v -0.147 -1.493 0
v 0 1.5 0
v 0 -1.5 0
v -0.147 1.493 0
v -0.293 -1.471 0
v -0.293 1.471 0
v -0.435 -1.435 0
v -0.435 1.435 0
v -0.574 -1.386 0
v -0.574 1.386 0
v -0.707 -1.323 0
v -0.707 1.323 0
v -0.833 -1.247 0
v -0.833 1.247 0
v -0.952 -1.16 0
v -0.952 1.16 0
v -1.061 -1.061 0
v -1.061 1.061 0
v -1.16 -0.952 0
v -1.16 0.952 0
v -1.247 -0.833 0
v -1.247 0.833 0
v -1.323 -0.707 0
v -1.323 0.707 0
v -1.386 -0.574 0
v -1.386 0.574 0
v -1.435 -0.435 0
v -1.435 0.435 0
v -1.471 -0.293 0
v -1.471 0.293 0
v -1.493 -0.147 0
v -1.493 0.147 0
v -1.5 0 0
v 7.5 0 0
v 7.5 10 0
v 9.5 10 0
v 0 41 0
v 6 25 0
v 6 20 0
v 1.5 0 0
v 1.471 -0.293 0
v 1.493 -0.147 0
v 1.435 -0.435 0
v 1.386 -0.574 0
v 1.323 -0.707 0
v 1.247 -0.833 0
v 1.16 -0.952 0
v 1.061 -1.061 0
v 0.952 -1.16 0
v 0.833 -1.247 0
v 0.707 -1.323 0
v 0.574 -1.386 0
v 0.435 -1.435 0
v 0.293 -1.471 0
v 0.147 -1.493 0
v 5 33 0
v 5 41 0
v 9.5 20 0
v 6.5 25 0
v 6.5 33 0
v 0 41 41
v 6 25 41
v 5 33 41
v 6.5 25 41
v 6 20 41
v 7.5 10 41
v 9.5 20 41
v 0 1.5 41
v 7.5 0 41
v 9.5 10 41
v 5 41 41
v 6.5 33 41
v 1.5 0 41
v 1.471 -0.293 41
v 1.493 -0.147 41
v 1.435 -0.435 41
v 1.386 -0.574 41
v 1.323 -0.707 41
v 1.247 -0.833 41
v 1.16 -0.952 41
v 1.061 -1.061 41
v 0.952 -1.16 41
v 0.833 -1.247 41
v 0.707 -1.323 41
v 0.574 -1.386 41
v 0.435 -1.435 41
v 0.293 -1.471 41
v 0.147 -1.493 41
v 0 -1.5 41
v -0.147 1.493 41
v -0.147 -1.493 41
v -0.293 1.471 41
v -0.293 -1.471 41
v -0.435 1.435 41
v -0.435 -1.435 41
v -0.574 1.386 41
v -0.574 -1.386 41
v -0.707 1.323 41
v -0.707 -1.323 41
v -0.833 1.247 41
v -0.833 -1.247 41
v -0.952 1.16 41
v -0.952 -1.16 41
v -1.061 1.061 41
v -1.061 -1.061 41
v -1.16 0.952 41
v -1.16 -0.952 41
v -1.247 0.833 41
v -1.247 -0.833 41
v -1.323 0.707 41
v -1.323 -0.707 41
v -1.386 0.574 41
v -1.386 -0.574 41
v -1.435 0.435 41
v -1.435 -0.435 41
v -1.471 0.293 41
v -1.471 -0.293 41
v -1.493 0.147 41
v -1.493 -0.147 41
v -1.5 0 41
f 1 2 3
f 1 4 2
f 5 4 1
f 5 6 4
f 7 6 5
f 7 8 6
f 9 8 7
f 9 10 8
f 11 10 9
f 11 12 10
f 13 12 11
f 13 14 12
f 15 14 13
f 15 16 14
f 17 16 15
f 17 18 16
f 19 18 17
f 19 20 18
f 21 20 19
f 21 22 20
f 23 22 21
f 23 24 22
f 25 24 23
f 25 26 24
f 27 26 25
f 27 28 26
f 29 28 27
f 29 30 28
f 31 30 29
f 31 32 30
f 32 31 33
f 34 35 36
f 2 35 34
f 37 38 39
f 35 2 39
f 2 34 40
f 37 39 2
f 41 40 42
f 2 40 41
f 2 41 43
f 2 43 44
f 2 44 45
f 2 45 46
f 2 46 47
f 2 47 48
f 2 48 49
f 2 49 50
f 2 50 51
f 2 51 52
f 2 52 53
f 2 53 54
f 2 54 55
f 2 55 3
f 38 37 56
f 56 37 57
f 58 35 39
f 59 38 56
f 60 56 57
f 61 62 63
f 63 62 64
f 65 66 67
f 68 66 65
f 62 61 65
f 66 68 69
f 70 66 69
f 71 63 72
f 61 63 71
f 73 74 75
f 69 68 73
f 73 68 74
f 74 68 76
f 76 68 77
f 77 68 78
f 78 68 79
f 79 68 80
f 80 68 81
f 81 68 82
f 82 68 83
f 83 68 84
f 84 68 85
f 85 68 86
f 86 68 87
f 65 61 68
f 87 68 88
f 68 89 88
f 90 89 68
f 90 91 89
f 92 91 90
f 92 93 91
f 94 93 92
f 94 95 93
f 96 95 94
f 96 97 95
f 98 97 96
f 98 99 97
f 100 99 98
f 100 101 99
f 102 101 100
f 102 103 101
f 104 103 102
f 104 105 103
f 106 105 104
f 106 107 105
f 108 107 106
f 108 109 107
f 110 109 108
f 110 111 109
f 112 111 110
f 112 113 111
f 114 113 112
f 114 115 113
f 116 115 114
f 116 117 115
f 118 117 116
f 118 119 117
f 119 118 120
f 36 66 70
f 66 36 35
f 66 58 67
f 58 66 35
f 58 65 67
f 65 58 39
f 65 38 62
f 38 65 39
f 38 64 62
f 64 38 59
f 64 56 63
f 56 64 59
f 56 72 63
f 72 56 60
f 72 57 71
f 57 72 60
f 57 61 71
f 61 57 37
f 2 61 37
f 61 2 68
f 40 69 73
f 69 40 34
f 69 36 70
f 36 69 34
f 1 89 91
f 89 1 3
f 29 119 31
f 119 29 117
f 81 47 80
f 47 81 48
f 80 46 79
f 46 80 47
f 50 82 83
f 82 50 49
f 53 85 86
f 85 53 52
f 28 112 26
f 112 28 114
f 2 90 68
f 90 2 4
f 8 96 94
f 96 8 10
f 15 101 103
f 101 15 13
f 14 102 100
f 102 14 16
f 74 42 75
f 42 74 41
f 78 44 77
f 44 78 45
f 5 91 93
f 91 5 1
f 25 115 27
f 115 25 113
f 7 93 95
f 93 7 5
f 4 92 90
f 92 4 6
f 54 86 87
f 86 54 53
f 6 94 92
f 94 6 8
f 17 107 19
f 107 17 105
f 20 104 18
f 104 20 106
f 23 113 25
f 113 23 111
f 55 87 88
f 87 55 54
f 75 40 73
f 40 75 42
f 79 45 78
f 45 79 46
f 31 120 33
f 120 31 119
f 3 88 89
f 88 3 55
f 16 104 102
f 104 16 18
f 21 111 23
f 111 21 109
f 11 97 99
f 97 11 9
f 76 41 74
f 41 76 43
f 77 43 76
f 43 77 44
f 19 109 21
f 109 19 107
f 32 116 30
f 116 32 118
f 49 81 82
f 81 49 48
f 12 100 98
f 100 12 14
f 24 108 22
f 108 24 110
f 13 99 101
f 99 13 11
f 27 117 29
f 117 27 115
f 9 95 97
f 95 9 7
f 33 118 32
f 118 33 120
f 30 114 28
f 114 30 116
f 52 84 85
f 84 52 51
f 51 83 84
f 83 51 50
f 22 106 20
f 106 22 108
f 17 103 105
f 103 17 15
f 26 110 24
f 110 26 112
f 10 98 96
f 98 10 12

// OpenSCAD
$fn = 64;

// Dimensions
bore_d = 3;
h_8 = 10;
od_8_bot = 7.5;
od_8_top = 9.5;
h_5 = 8;
od_5_bot = 6.5;
od_5_top = 5.0;
z_collar_start = 20;
z_collar_end = 25;
collar_d = 12;
z_5_start = 25;
z_5_end = 41;

// Profile Points (X, Z)
// Note: In linear_extrude, the shape is defined in X-Y plane, extruded along Z.
// We map Z to Y.
// We trace the outer wall clockwise.

outer_wall = [
    [0, 0], // Center bottom
    [od_8_bot, 0], // Bottom outer
    [od_8_top, h_8], // Top of first 8mm barb
    [od_8_top, h_8], // Step back
    [od_8_bot, h_8], // Bottom of first 8mm barb
    [od_8_top, h_8 * 2], // Top of second 8mm barb
    [od_8_top, h_8 * 2], // Step back
    [od_8_bot, h_8 * 2], // Bottom of second 8mm barb
    [collar_d / 2, h_8 * 2], // Step to collar
    [collar_d / 2, z_collar_end], // Top of collar
    [collar_d / 2, z_collar_end], // Step back
    [od_5_bot, z_collar_end], // Bottom of first 5mm barb
    [od_5_top, z_5_start + h_5], // Top of first 5mm barb
    [od_5_top, z_5_start + h_5], // Step back
    [od_5_bot, z_5_start + h_5], // Bottom of first 5mm barb
    [od_5_top, z_5_end], // Top of second 5mm barb
    [od_5_top, z_5_end], // Step back
    [od_5_bot, z_5_end], // Bottom of second 5mm barb
    [0, z_5_end] // Step to center
];

// Construct the part
module part() {
    // Extrude the outer wall
    linear_extrude(height = z_5_end, center = false) {
        polygon(outer_wall);
    }

    // Subtract the bore
    // The bore is a cylinder along the Z axis
    translate([0, 0, 0])
    cylinder(r = bore_d / 2, h = z_5_end, center = false);
}

part();
